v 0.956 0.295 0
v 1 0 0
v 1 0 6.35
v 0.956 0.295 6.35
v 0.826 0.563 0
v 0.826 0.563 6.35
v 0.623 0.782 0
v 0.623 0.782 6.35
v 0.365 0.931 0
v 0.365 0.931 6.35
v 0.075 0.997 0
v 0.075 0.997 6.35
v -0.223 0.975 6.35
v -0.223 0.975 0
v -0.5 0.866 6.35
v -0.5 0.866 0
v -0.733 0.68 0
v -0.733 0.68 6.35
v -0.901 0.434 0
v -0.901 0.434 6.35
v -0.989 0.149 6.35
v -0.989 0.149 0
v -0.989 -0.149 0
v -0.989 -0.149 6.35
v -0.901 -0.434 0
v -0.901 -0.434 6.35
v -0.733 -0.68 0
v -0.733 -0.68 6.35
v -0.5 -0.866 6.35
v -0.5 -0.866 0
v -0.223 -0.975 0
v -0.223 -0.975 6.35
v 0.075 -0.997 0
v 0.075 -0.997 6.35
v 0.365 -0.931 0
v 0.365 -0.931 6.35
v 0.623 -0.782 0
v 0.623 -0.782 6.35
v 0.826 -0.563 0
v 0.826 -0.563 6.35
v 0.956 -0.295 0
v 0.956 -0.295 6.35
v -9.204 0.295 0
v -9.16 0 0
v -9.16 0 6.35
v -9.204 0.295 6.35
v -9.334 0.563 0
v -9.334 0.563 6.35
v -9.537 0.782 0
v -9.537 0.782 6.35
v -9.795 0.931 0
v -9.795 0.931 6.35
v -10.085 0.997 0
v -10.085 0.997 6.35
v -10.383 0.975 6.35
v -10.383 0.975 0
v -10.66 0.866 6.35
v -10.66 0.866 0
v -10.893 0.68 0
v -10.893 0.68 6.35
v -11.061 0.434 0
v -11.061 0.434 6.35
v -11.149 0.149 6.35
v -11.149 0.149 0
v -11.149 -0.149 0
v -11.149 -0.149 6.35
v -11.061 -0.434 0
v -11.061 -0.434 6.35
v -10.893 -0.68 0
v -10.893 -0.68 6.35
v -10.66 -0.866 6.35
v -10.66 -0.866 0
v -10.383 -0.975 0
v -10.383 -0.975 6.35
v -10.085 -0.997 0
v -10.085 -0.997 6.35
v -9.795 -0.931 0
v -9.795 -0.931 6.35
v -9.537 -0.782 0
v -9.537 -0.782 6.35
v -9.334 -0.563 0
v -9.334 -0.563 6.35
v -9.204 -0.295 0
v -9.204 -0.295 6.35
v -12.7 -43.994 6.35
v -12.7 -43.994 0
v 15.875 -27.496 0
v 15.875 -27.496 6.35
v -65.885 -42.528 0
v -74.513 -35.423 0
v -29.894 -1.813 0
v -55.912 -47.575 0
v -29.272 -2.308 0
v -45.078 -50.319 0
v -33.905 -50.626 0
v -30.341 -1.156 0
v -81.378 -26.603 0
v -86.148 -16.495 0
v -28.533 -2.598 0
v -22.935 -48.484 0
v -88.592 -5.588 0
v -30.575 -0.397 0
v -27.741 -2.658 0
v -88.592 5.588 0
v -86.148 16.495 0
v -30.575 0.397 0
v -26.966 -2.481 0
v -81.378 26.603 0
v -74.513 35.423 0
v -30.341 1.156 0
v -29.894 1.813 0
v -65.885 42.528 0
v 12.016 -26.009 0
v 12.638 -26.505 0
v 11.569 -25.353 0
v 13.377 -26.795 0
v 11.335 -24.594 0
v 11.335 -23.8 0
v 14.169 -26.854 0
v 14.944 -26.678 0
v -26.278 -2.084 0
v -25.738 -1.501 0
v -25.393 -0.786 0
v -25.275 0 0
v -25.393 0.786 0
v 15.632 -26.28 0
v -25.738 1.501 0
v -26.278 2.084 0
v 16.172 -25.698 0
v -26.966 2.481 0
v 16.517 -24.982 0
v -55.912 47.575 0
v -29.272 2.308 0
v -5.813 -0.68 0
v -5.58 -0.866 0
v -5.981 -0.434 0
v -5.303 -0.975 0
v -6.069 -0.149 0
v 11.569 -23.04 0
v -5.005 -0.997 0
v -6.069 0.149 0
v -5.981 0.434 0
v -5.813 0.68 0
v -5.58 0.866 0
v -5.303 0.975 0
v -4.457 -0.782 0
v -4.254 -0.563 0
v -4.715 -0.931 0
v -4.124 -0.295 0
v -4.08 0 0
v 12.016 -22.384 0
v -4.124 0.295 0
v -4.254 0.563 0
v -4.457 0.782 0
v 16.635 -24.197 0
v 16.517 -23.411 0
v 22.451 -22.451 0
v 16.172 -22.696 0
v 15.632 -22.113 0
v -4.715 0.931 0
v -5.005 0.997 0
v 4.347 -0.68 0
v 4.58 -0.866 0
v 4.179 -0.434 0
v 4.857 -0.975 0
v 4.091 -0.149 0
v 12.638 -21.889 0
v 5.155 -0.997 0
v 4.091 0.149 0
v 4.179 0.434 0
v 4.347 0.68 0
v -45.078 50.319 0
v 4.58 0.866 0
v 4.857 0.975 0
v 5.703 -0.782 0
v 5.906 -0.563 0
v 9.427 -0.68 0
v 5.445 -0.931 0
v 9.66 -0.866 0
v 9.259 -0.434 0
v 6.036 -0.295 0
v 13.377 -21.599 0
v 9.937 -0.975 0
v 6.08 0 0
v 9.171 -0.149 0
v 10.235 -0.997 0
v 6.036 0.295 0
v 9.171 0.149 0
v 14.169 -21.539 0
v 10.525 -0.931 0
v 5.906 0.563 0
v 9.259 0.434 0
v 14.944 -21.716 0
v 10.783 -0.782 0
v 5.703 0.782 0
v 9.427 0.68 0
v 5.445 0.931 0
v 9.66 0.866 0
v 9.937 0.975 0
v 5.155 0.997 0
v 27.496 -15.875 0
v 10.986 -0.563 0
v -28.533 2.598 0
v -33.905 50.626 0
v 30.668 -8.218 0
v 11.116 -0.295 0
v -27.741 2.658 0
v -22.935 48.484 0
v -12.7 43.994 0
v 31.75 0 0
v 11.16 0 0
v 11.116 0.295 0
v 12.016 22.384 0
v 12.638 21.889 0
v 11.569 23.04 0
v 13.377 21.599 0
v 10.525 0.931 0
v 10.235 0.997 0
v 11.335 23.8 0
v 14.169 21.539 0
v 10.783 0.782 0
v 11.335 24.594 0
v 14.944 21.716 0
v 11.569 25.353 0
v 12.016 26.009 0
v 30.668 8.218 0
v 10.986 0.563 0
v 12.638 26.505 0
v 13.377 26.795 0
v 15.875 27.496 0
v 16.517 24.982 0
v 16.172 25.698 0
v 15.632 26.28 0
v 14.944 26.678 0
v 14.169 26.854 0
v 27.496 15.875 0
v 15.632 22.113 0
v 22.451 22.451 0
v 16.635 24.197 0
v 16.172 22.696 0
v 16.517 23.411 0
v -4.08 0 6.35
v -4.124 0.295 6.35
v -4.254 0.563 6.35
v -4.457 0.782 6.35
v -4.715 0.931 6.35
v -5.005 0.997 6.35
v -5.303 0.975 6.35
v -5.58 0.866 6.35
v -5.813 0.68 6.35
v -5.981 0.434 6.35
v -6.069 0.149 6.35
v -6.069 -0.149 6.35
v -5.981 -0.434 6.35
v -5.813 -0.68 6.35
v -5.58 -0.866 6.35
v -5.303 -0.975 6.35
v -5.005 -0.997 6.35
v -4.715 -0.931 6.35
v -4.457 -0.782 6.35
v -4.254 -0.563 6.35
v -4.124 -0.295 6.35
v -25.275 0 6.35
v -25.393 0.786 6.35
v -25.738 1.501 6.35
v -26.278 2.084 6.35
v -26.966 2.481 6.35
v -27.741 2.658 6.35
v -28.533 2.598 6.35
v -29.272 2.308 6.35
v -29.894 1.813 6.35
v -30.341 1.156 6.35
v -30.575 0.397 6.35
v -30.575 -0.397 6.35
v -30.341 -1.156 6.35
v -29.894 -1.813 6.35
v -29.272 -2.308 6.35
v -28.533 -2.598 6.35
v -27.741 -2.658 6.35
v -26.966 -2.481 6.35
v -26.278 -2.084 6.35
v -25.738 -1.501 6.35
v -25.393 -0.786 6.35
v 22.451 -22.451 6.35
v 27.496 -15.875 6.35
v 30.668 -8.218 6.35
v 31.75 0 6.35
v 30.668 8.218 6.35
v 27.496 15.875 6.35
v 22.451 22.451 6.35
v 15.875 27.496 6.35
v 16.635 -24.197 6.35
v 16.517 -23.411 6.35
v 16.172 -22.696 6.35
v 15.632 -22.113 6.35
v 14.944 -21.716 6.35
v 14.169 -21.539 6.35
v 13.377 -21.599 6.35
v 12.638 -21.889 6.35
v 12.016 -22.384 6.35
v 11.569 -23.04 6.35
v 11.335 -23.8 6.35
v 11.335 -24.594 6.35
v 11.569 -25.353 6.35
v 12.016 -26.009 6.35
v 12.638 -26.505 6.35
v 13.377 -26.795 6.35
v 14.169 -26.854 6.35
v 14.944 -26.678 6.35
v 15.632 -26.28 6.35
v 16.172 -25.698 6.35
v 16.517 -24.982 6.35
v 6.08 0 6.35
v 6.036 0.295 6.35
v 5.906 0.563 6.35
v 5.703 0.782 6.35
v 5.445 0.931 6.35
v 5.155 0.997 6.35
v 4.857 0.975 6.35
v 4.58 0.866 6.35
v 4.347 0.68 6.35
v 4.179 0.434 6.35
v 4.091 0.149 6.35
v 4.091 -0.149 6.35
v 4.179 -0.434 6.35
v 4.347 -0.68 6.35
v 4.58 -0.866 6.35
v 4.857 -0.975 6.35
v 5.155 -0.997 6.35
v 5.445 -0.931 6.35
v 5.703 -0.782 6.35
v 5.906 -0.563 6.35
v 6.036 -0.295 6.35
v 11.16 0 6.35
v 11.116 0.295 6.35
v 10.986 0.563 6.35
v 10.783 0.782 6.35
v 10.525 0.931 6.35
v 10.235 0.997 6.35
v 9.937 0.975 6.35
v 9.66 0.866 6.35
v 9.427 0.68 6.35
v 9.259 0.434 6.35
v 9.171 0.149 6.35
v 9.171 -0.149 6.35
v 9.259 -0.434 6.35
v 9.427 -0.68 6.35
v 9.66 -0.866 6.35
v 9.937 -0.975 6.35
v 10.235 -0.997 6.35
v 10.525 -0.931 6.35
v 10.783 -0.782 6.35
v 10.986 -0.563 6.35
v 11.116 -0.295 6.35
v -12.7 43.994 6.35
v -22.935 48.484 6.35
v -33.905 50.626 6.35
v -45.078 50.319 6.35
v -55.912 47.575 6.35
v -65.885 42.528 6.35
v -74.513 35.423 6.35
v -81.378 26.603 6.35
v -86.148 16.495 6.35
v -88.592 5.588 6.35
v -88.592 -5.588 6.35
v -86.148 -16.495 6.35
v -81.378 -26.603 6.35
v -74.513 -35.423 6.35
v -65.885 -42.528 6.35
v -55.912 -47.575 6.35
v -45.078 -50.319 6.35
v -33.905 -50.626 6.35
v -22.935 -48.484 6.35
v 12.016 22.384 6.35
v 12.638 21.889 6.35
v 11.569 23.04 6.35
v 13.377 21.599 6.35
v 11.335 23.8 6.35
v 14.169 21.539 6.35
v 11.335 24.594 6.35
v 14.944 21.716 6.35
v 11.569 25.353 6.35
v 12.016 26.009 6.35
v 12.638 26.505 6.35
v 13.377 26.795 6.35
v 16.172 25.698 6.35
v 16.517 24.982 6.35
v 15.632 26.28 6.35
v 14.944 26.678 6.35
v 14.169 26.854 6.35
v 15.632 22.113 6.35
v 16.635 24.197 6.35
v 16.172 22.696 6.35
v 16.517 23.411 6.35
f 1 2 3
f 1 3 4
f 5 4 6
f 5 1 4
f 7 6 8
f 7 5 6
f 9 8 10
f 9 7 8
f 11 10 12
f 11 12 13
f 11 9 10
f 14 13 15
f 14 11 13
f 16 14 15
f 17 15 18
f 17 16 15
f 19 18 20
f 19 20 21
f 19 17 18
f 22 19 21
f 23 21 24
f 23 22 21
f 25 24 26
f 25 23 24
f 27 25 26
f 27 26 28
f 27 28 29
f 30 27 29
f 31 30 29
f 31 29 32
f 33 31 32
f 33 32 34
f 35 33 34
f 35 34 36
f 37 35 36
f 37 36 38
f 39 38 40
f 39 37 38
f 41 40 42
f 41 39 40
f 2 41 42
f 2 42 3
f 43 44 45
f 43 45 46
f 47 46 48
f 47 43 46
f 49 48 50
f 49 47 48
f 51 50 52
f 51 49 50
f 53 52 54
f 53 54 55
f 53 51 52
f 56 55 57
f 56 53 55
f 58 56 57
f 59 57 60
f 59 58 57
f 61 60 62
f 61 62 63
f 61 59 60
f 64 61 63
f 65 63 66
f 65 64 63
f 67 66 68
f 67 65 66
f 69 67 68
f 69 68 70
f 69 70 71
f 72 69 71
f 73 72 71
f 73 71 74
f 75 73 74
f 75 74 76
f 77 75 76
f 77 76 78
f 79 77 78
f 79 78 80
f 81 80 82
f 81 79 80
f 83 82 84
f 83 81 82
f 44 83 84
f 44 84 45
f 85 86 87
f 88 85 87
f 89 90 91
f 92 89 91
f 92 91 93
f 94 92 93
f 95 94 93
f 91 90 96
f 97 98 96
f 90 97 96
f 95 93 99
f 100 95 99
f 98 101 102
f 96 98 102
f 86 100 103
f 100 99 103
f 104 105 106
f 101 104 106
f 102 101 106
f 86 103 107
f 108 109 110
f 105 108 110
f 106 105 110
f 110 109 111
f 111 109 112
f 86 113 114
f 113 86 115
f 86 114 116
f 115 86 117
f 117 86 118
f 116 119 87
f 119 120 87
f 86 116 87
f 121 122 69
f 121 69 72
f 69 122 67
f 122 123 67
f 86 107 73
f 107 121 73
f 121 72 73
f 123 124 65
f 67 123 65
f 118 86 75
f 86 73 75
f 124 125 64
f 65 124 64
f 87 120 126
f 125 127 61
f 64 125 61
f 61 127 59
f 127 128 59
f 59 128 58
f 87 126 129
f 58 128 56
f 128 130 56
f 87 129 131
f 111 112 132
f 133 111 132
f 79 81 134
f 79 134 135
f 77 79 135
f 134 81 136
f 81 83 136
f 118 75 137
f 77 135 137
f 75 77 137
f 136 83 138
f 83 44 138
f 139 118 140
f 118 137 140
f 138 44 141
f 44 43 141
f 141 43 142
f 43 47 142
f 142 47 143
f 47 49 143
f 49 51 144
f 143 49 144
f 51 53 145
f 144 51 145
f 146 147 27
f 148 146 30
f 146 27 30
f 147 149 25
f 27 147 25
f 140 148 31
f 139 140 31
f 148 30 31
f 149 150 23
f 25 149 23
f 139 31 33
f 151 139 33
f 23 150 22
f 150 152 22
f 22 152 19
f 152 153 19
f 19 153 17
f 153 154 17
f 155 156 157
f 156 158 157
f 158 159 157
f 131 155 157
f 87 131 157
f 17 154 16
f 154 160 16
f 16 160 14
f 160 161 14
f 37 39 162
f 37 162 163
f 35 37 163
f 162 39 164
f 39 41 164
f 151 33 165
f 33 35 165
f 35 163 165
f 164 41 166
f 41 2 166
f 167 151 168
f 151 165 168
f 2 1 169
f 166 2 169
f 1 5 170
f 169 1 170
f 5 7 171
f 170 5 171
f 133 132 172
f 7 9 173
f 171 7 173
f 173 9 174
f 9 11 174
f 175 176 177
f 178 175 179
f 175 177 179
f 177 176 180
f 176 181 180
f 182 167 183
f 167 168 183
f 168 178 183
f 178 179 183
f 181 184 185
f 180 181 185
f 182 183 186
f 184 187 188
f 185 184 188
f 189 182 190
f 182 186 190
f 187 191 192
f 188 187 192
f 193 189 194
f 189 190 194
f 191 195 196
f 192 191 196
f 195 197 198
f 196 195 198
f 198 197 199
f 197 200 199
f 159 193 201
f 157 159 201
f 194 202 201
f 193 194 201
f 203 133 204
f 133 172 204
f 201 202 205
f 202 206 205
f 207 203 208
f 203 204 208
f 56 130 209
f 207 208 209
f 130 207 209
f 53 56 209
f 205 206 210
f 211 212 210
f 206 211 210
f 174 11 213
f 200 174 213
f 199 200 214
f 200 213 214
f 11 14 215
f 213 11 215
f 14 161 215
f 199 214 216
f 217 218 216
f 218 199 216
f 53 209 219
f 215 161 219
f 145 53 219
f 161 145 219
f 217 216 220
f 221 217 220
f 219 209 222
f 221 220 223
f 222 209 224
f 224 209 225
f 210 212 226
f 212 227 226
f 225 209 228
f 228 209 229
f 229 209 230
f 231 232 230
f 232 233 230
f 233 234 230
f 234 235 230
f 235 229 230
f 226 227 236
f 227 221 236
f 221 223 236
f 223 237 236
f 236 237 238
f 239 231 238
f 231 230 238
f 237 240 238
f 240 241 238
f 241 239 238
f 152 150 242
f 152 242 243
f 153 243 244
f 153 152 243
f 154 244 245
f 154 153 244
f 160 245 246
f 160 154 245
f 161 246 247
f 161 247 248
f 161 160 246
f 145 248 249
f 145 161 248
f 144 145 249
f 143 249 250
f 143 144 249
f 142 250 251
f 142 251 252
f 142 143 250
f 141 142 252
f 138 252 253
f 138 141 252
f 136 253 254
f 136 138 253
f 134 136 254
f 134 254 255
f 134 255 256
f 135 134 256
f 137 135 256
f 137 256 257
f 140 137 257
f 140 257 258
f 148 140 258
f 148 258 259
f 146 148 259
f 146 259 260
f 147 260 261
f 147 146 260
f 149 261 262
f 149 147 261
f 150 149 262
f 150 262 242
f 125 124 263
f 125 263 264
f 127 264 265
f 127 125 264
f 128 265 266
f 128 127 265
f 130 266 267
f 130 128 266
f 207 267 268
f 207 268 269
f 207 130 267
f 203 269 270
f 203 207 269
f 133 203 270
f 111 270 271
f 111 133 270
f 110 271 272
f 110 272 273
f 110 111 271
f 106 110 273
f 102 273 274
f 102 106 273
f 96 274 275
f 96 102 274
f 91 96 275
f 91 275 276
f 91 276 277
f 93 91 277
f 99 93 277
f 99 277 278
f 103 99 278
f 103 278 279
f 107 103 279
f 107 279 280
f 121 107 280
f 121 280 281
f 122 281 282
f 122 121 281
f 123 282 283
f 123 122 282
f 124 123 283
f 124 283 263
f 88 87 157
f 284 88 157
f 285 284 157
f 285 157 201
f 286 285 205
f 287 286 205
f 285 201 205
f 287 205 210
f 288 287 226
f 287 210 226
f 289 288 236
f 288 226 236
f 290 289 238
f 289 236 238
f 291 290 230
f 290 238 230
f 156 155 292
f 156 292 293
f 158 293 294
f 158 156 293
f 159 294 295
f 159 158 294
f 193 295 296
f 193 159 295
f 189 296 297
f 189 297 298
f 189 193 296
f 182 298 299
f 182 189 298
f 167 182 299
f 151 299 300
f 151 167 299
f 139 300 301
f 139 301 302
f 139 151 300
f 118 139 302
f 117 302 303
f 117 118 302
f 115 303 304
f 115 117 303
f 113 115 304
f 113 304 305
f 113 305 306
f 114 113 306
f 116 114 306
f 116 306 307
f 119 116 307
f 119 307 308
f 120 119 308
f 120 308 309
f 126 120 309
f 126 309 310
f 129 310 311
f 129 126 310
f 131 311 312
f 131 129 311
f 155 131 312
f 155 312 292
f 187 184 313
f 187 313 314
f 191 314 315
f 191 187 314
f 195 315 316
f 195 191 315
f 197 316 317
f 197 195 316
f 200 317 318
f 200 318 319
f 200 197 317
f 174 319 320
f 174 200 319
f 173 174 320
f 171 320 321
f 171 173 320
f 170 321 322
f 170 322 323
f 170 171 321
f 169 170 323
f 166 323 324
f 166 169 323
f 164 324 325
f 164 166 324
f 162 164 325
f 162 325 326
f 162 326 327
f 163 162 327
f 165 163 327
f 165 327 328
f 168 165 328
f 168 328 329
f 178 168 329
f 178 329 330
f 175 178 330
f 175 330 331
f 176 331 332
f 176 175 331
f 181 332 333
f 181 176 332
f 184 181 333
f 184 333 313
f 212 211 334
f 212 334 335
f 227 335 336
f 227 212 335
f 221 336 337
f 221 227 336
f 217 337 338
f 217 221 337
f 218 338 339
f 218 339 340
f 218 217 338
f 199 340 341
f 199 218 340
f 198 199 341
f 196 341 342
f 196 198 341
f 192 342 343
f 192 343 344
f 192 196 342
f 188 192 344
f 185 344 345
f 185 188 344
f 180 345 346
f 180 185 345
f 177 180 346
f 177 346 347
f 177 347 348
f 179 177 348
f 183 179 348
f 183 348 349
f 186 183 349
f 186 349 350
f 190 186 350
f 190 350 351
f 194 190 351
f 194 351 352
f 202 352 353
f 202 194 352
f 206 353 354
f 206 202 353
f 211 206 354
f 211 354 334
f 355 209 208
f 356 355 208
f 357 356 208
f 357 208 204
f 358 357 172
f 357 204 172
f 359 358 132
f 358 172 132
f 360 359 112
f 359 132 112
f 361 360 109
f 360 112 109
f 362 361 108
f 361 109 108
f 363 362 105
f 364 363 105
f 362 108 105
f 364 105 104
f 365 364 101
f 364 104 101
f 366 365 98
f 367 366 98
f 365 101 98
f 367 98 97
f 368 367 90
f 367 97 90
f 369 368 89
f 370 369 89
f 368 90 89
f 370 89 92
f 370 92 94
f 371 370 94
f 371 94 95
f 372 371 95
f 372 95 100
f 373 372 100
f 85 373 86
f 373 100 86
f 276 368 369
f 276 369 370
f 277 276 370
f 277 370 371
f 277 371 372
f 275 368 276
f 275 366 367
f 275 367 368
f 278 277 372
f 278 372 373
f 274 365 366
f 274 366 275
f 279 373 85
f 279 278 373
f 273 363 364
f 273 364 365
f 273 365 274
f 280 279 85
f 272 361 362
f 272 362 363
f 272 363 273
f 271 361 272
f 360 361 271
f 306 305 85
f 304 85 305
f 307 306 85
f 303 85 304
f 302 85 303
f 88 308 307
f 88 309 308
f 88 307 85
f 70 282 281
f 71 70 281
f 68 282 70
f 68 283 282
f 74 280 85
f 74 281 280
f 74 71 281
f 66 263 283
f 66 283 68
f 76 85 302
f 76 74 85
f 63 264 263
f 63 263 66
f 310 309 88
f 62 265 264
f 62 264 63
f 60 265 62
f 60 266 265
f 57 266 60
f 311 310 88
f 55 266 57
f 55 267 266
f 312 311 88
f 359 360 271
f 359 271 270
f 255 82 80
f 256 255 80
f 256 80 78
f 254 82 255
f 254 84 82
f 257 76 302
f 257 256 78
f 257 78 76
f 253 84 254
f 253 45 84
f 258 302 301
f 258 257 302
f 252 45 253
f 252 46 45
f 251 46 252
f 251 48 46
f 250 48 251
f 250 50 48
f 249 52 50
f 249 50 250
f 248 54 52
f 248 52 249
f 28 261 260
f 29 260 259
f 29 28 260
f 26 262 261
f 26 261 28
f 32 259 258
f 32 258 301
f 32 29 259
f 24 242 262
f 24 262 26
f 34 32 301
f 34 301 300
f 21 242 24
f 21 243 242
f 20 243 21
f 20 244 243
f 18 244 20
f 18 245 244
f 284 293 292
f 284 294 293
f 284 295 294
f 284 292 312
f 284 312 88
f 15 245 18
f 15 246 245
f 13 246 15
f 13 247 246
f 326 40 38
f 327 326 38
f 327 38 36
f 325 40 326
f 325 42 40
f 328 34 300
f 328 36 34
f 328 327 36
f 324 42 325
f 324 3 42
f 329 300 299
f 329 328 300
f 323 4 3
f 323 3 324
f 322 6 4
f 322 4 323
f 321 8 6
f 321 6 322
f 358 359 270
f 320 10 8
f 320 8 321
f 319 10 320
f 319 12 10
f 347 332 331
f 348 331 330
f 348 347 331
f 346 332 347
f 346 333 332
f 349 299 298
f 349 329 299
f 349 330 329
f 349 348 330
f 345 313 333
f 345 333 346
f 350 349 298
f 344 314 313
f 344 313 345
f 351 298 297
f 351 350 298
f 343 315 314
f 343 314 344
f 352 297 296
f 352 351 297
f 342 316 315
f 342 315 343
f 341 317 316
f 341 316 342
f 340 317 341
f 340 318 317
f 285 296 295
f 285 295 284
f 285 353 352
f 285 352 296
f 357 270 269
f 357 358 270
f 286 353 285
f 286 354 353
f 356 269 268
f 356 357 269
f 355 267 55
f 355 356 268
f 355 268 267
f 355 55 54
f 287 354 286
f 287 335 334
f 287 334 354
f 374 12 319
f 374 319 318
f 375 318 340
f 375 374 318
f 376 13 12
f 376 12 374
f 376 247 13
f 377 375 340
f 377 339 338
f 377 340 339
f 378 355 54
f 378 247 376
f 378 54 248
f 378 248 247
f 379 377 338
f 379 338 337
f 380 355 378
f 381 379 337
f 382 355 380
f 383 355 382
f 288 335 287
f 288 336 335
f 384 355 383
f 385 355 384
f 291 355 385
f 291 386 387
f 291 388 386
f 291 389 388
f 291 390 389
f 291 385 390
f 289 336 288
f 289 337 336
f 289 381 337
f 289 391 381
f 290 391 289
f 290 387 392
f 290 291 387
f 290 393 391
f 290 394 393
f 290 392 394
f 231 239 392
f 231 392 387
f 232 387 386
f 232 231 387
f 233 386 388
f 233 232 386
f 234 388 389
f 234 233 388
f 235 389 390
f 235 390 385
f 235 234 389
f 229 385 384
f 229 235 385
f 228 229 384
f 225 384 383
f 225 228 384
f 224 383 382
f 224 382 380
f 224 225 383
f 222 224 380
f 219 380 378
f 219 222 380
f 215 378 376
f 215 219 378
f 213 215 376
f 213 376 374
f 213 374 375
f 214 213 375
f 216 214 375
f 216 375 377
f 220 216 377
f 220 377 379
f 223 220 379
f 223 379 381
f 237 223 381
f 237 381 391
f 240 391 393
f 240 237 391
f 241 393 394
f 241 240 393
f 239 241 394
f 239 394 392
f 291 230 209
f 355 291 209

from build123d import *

# Parameters (mm, degrees)
SKETCH1_R           = 2.665
SKETCH1_R_2         = 1
BOSS_EXTRUDE1_DEPTH = 6.35


with BuildPart() as part:
    # Sketch1 → Boss-Extrude1 (new body)
    with BuildSketch(Plane.XY):
        with BuildLine():
            ThreePointArc((-12.7, 43.994090512), (-88.9, 0), (-12.7, -43.994090512))
            Line((-12.7, -43.994090512), (15.875, -27.49630657))
            ThreePointArc((15.875, -27.49630657), (31.75, 0), (15.875, 27.49630657))
            Line((15.875, 27.49630657), (-12.7, 43.994090512))
        make_face()
        with Locations((13.97, -24.196749782)):
            Circle(SKETCH1_R, mode=Mode.SUBTRACT)
        with Locations((13.97, 24.196749782)):
            Circle(SKETCH1_R, mode=Mode.SUBTRACT)
        with Locations((5.08, 0)):
            Circle(SKETCH1_R_2, mode=Mode.SUBTRACT)
        with Locations((10.16, 0)):
            Circle(SKETCH1_R_2, mode=Mode.SUBTRACT)
        Circle(SKETCH1_R_2, mode=Mode.SUBTRACT)
        with Locations((-27.94, 0)):
            Circle(SKETCH1_R, mode=Mode.SUBTRACT)
        with Locations((-10.16, 0)):
            Circle(SKETCH1_R_2, mode=Mode.SUBTRACT)
        with Locations((-5.08, 0)):
            Circle(SKETCH1_R_2, mode=Mode.SUBTRACT)
    extrude(amount=BOSS_EXTRUDE1_DEPTH)


solid = part.part
